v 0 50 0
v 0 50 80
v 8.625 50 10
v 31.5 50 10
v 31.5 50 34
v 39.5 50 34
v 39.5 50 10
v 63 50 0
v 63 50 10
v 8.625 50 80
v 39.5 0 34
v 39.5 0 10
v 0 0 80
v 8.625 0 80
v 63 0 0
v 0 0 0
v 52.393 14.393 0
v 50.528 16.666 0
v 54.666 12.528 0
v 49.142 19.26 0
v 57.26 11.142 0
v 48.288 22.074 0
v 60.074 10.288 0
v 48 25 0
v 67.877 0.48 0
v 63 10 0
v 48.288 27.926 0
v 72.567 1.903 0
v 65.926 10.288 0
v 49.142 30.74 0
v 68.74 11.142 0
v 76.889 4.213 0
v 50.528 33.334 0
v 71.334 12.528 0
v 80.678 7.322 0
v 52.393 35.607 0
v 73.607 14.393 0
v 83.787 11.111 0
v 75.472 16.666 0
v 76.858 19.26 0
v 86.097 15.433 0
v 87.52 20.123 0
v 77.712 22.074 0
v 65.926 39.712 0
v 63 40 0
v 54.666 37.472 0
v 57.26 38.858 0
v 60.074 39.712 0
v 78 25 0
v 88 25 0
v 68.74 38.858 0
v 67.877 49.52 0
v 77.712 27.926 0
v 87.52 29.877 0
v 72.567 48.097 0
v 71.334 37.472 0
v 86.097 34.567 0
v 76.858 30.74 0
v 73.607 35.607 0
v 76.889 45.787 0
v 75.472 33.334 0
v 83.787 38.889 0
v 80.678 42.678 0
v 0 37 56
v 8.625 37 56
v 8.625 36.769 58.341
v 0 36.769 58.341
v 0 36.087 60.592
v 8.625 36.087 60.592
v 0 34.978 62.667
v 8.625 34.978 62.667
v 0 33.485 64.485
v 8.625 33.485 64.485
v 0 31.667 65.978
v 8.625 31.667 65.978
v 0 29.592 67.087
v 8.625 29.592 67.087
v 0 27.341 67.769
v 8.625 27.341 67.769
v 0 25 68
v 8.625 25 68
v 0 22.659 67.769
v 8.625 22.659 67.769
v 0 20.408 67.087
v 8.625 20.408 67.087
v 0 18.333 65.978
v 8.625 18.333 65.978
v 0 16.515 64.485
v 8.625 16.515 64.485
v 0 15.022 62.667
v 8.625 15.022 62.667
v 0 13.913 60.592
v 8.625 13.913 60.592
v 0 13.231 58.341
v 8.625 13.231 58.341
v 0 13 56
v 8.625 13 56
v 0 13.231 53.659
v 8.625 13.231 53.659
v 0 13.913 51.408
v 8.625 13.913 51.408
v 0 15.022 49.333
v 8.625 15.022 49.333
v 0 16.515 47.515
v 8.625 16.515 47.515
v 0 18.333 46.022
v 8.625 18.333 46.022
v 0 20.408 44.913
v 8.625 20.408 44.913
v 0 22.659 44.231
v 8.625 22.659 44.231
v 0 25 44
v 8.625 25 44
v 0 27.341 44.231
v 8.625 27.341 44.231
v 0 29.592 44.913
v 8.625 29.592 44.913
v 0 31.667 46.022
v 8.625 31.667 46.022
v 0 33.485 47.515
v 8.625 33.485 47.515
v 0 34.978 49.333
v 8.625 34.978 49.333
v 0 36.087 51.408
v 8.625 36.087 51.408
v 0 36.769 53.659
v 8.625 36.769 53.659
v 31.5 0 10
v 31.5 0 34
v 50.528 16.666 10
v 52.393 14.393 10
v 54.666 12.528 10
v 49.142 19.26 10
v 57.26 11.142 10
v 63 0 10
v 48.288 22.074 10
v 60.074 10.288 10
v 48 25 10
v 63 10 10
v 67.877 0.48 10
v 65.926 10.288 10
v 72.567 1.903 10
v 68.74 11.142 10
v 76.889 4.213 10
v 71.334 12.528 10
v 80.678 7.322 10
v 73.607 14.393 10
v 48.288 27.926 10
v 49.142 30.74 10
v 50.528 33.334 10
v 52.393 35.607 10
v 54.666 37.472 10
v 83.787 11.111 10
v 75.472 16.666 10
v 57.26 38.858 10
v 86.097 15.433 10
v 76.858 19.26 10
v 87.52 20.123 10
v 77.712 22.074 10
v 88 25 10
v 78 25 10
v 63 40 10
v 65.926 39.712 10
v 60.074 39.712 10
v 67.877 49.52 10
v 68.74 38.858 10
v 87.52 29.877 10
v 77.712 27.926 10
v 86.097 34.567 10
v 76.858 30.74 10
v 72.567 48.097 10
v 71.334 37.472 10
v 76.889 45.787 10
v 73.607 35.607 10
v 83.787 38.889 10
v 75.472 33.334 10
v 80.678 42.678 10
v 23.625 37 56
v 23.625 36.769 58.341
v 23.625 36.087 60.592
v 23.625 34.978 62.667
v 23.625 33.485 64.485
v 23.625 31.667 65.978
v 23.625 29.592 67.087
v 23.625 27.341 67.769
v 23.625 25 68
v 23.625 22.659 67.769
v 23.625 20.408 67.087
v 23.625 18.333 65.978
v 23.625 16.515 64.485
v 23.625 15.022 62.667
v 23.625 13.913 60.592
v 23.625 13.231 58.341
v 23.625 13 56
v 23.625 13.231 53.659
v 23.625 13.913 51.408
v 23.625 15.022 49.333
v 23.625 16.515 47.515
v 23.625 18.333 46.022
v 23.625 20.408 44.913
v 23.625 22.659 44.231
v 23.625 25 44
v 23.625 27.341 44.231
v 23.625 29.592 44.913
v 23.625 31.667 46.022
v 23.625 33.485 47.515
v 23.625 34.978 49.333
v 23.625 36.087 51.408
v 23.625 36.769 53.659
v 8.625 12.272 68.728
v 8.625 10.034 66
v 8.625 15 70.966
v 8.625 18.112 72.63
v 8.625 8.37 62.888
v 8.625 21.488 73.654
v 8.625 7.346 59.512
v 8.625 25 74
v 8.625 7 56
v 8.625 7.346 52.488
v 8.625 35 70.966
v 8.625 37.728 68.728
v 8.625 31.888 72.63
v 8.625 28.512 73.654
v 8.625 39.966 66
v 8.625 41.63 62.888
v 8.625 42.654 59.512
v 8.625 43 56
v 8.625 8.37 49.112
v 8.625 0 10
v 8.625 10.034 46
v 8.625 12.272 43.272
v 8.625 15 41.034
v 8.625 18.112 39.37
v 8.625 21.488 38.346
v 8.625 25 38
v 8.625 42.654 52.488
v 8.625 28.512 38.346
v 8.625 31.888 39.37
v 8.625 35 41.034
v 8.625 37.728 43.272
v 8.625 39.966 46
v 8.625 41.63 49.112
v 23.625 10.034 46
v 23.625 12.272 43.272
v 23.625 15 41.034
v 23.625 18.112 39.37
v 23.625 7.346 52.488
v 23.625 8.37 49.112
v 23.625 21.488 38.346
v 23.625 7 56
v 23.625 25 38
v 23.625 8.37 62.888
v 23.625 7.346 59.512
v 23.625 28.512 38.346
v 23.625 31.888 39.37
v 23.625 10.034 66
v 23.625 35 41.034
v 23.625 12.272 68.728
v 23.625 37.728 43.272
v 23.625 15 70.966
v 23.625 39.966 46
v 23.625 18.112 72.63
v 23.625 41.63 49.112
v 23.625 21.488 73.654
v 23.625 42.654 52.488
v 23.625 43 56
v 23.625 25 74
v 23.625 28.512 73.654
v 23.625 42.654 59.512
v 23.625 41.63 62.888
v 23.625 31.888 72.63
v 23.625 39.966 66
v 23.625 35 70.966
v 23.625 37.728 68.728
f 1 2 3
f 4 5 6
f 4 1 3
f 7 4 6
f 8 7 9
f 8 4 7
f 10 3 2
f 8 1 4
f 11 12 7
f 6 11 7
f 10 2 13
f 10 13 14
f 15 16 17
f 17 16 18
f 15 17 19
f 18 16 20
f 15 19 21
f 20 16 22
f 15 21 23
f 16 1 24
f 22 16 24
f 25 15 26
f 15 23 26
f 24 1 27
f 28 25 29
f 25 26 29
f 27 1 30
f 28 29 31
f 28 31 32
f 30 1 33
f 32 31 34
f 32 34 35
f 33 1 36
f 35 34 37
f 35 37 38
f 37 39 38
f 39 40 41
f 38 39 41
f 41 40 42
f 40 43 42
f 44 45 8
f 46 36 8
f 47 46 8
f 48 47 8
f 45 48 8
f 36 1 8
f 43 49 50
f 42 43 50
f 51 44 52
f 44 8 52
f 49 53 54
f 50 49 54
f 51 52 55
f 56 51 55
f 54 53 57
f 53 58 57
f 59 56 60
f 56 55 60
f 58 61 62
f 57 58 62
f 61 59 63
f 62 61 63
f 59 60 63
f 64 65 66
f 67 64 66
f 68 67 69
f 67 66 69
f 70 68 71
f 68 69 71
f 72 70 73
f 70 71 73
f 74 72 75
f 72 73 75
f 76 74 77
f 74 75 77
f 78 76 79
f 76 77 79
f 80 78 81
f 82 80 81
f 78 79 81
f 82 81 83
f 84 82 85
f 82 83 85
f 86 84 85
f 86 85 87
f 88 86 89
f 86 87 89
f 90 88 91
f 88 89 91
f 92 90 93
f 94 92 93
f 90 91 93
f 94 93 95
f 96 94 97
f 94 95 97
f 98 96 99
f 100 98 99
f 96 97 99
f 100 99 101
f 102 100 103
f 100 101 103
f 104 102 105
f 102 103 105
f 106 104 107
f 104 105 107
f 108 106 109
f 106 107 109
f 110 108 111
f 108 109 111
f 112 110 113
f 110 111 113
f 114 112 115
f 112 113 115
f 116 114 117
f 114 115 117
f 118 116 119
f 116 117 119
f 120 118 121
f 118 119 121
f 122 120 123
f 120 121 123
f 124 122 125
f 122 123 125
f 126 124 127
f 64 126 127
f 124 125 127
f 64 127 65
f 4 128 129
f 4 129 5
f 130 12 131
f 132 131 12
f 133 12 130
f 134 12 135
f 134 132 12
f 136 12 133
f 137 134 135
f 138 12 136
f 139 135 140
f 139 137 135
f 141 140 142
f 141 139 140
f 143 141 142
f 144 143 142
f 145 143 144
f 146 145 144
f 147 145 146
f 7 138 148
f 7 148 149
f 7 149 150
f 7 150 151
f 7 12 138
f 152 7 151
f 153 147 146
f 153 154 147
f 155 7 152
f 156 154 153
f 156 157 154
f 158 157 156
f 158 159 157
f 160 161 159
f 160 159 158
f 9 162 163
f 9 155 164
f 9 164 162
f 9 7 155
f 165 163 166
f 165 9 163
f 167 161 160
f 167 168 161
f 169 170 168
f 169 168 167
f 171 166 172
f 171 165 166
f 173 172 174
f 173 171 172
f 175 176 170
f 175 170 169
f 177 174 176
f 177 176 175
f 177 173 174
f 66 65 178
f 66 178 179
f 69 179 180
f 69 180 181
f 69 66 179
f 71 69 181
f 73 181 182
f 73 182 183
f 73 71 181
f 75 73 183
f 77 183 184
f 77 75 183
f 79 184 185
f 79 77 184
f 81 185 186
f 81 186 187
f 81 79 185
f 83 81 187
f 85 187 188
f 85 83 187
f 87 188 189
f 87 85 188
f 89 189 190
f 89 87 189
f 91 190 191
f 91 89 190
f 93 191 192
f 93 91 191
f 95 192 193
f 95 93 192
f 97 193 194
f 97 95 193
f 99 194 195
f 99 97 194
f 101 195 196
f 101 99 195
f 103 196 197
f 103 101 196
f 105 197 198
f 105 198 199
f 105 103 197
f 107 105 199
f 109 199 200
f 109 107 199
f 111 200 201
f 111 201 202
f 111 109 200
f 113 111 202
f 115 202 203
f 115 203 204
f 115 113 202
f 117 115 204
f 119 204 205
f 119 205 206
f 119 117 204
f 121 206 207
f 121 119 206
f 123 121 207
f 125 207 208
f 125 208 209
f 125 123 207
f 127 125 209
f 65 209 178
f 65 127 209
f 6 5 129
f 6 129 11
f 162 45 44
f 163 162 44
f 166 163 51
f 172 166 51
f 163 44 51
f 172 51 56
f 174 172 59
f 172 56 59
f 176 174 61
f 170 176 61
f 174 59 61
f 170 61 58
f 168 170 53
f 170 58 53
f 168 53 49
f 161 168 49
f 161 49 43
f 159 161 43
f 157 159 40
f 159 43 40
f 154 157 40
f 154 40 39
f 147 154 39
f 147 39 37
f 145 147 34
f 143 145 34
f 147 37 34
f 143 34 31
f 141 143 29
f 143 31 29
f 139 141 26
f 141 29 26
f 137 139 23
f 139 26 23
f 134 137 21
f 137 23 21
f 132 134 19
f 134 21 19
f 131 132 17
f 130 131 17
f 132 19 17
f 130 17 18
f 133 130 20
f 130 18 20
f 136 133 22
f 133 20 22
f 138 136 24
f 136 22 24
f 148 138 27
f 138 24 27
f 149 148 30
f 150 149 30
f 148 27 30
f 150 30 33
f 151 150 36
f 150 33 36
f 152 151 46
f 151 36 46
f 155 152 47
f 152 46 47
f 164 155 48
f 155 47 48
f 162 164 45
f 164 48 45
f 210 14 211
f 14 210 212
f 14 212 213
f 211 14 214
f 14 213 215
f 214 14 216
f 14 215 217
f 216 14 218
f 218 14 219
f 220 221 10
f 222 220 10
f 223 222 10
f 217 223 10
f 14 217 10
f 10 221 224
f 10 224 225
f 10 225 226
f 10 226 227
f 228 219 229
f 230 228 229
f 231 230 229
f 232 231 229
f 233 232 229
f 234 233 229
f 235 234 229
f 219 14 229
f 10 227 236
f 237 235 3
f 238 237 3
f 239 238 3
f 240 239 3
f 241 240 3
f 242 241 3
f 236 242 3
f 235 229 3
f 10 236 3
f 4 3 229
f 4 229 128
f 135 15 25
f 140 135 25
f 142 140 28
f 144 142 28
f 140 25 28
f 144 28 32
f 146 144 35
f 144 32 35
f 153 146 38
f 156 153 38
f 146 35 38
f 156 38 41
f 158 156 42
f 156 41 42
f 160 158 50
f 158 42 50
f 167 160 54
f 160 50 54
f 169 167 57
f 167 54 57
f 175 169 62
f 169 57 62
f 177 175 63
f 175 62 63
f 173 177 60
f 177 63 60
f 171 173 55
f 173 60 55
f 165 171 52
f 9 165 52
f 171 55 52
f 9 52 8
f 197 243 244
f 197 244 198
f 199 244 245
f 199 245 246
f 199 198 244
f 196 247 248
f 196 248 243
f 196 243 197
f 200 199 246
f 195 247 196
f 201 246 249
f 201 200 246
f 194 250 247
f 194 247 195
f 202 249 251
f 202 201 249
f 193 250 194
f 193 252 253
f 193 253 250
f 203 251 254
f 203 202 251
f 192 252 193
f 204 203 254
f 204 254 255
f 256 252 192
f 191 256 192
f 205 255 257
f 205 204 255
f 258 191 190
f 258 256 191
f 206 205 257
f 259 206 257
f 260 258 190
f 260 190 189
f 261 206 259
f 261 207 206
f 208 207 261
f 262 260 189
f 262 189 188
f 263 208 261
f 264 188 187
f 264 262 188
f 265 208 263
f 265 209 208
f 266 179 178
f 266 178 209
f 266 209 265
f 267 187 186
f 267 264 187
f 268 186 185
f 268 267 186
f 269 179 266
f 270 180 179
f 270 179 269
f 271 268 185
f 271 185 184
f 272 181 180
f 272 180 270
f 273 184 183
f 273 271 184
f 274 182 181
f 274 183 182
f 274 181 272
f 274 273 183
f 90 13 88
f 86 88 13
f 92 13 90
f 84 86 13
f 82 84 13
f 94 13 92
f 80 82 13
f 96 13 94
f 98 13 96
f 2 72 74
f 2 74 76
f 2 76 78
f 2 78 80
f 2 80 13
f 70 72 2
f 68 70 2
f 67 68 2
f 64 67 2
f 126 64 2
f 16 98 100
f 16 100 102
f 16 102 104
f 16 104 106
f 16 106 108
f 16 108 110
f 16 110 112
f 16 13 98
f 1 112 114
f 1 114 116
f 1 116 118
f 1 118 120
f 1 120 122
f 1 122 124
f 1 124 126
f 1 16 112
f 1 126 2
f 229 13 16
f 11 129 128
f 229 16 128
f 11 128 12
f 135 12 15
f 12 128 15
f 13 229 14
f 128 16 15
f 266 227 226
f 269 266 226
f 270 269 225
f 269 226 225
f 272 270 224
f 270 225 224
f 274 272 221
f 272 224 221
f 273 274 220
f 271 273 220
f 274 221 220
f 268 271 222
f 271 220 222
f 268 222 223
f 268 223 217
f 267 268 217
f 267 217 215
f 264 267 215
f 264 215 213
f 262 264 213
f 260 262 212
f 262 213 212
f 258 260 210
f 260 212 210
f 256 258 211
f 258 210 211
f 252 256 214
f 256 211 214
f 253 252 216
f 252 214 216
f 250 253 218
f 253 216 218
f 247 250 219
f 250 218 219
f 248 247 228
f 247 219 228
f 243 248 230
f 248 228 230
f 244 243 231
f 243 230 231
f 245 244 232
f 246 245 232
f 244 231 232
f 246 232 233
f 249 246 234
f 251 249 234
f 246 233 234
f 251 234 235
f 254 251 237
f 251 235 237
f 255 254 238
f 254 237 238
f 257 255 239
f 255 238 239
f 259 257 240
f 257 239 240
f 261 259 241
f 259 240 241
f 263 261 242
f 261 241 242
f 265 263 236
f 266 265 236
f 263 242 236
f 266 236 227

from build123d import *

# Parameters (mm, degrees)
F1_DEPTH = 10
F2_W     = 8
F2_H     = 50
F3_DEPTH = 24
F4_W     = 8.6245508865
F4_H     = 50
F5_DEPTH = 70
F6_R     = 18
F6_R_2   = 12
F7_DEPTH = 15
F8_R     = 12
F9_DEPTH = 8.6245508865


with BuildPart() as f1:
    # F0 (on Top) → F1 (new body)
    with BuildSketch(Plane.XY):
        with BuildLine():
            Line((0, 50), (0, 0))
            Line((0, 0), (63, 0))
            ThreePointArc((63, 0), (88, 25), (63, 50))
            Line((63, 50), (0, 50))
        make_face()
        with BuildLine():
            ThreePointArc((78, 25), (52.3933982822, 14.3933982822), (63, 40))
            ThreePointArc((63, 40), (73.6066017178, 35.6066017178), (78, 25))
        make_face(mode=Mode.SUBTRACT)
    extrude(amount=F1_DEPTH)

    # F2 (on face) → F3 (join)
    with BuildSketch(Plane.XY.offset(10)):
        with Locations((35.5, 25)):
            Rectangle(F2_W, F2_H)
    extrude(amount=F3_DEPTH)

    # F4 (on face) → F5 (join)
    with BuildSketch(Plane.XY.offset(10)):
        with Locations((4.3122754432, 25)):
            Rectangle(F4_W, F4_H)
    extrude(amount=F5_DEPTH)

    # F6 (on face) → F7 (join)
    with BuildSketch(Plane.YZ.offset(8.6245508865)):
        with Locations((25, 56)):
            Circle(F6_R)
        with Locations((25, 56)):
            Circle(F6_R_2, mode=Mode.SUBTRACT)
    extrude(amount=F7_DEPTH)

    # F8 (on face) → F9 (cut, through all)
    with BuildSketch(Plane.YZ.offset(8.6245508865)):
        with Locations((25, 56)):
            Circle(F8_R)
    extrude(amount=-F9_DEPTH, mode=Mode.SUBTRACT)


solid = f1.part
